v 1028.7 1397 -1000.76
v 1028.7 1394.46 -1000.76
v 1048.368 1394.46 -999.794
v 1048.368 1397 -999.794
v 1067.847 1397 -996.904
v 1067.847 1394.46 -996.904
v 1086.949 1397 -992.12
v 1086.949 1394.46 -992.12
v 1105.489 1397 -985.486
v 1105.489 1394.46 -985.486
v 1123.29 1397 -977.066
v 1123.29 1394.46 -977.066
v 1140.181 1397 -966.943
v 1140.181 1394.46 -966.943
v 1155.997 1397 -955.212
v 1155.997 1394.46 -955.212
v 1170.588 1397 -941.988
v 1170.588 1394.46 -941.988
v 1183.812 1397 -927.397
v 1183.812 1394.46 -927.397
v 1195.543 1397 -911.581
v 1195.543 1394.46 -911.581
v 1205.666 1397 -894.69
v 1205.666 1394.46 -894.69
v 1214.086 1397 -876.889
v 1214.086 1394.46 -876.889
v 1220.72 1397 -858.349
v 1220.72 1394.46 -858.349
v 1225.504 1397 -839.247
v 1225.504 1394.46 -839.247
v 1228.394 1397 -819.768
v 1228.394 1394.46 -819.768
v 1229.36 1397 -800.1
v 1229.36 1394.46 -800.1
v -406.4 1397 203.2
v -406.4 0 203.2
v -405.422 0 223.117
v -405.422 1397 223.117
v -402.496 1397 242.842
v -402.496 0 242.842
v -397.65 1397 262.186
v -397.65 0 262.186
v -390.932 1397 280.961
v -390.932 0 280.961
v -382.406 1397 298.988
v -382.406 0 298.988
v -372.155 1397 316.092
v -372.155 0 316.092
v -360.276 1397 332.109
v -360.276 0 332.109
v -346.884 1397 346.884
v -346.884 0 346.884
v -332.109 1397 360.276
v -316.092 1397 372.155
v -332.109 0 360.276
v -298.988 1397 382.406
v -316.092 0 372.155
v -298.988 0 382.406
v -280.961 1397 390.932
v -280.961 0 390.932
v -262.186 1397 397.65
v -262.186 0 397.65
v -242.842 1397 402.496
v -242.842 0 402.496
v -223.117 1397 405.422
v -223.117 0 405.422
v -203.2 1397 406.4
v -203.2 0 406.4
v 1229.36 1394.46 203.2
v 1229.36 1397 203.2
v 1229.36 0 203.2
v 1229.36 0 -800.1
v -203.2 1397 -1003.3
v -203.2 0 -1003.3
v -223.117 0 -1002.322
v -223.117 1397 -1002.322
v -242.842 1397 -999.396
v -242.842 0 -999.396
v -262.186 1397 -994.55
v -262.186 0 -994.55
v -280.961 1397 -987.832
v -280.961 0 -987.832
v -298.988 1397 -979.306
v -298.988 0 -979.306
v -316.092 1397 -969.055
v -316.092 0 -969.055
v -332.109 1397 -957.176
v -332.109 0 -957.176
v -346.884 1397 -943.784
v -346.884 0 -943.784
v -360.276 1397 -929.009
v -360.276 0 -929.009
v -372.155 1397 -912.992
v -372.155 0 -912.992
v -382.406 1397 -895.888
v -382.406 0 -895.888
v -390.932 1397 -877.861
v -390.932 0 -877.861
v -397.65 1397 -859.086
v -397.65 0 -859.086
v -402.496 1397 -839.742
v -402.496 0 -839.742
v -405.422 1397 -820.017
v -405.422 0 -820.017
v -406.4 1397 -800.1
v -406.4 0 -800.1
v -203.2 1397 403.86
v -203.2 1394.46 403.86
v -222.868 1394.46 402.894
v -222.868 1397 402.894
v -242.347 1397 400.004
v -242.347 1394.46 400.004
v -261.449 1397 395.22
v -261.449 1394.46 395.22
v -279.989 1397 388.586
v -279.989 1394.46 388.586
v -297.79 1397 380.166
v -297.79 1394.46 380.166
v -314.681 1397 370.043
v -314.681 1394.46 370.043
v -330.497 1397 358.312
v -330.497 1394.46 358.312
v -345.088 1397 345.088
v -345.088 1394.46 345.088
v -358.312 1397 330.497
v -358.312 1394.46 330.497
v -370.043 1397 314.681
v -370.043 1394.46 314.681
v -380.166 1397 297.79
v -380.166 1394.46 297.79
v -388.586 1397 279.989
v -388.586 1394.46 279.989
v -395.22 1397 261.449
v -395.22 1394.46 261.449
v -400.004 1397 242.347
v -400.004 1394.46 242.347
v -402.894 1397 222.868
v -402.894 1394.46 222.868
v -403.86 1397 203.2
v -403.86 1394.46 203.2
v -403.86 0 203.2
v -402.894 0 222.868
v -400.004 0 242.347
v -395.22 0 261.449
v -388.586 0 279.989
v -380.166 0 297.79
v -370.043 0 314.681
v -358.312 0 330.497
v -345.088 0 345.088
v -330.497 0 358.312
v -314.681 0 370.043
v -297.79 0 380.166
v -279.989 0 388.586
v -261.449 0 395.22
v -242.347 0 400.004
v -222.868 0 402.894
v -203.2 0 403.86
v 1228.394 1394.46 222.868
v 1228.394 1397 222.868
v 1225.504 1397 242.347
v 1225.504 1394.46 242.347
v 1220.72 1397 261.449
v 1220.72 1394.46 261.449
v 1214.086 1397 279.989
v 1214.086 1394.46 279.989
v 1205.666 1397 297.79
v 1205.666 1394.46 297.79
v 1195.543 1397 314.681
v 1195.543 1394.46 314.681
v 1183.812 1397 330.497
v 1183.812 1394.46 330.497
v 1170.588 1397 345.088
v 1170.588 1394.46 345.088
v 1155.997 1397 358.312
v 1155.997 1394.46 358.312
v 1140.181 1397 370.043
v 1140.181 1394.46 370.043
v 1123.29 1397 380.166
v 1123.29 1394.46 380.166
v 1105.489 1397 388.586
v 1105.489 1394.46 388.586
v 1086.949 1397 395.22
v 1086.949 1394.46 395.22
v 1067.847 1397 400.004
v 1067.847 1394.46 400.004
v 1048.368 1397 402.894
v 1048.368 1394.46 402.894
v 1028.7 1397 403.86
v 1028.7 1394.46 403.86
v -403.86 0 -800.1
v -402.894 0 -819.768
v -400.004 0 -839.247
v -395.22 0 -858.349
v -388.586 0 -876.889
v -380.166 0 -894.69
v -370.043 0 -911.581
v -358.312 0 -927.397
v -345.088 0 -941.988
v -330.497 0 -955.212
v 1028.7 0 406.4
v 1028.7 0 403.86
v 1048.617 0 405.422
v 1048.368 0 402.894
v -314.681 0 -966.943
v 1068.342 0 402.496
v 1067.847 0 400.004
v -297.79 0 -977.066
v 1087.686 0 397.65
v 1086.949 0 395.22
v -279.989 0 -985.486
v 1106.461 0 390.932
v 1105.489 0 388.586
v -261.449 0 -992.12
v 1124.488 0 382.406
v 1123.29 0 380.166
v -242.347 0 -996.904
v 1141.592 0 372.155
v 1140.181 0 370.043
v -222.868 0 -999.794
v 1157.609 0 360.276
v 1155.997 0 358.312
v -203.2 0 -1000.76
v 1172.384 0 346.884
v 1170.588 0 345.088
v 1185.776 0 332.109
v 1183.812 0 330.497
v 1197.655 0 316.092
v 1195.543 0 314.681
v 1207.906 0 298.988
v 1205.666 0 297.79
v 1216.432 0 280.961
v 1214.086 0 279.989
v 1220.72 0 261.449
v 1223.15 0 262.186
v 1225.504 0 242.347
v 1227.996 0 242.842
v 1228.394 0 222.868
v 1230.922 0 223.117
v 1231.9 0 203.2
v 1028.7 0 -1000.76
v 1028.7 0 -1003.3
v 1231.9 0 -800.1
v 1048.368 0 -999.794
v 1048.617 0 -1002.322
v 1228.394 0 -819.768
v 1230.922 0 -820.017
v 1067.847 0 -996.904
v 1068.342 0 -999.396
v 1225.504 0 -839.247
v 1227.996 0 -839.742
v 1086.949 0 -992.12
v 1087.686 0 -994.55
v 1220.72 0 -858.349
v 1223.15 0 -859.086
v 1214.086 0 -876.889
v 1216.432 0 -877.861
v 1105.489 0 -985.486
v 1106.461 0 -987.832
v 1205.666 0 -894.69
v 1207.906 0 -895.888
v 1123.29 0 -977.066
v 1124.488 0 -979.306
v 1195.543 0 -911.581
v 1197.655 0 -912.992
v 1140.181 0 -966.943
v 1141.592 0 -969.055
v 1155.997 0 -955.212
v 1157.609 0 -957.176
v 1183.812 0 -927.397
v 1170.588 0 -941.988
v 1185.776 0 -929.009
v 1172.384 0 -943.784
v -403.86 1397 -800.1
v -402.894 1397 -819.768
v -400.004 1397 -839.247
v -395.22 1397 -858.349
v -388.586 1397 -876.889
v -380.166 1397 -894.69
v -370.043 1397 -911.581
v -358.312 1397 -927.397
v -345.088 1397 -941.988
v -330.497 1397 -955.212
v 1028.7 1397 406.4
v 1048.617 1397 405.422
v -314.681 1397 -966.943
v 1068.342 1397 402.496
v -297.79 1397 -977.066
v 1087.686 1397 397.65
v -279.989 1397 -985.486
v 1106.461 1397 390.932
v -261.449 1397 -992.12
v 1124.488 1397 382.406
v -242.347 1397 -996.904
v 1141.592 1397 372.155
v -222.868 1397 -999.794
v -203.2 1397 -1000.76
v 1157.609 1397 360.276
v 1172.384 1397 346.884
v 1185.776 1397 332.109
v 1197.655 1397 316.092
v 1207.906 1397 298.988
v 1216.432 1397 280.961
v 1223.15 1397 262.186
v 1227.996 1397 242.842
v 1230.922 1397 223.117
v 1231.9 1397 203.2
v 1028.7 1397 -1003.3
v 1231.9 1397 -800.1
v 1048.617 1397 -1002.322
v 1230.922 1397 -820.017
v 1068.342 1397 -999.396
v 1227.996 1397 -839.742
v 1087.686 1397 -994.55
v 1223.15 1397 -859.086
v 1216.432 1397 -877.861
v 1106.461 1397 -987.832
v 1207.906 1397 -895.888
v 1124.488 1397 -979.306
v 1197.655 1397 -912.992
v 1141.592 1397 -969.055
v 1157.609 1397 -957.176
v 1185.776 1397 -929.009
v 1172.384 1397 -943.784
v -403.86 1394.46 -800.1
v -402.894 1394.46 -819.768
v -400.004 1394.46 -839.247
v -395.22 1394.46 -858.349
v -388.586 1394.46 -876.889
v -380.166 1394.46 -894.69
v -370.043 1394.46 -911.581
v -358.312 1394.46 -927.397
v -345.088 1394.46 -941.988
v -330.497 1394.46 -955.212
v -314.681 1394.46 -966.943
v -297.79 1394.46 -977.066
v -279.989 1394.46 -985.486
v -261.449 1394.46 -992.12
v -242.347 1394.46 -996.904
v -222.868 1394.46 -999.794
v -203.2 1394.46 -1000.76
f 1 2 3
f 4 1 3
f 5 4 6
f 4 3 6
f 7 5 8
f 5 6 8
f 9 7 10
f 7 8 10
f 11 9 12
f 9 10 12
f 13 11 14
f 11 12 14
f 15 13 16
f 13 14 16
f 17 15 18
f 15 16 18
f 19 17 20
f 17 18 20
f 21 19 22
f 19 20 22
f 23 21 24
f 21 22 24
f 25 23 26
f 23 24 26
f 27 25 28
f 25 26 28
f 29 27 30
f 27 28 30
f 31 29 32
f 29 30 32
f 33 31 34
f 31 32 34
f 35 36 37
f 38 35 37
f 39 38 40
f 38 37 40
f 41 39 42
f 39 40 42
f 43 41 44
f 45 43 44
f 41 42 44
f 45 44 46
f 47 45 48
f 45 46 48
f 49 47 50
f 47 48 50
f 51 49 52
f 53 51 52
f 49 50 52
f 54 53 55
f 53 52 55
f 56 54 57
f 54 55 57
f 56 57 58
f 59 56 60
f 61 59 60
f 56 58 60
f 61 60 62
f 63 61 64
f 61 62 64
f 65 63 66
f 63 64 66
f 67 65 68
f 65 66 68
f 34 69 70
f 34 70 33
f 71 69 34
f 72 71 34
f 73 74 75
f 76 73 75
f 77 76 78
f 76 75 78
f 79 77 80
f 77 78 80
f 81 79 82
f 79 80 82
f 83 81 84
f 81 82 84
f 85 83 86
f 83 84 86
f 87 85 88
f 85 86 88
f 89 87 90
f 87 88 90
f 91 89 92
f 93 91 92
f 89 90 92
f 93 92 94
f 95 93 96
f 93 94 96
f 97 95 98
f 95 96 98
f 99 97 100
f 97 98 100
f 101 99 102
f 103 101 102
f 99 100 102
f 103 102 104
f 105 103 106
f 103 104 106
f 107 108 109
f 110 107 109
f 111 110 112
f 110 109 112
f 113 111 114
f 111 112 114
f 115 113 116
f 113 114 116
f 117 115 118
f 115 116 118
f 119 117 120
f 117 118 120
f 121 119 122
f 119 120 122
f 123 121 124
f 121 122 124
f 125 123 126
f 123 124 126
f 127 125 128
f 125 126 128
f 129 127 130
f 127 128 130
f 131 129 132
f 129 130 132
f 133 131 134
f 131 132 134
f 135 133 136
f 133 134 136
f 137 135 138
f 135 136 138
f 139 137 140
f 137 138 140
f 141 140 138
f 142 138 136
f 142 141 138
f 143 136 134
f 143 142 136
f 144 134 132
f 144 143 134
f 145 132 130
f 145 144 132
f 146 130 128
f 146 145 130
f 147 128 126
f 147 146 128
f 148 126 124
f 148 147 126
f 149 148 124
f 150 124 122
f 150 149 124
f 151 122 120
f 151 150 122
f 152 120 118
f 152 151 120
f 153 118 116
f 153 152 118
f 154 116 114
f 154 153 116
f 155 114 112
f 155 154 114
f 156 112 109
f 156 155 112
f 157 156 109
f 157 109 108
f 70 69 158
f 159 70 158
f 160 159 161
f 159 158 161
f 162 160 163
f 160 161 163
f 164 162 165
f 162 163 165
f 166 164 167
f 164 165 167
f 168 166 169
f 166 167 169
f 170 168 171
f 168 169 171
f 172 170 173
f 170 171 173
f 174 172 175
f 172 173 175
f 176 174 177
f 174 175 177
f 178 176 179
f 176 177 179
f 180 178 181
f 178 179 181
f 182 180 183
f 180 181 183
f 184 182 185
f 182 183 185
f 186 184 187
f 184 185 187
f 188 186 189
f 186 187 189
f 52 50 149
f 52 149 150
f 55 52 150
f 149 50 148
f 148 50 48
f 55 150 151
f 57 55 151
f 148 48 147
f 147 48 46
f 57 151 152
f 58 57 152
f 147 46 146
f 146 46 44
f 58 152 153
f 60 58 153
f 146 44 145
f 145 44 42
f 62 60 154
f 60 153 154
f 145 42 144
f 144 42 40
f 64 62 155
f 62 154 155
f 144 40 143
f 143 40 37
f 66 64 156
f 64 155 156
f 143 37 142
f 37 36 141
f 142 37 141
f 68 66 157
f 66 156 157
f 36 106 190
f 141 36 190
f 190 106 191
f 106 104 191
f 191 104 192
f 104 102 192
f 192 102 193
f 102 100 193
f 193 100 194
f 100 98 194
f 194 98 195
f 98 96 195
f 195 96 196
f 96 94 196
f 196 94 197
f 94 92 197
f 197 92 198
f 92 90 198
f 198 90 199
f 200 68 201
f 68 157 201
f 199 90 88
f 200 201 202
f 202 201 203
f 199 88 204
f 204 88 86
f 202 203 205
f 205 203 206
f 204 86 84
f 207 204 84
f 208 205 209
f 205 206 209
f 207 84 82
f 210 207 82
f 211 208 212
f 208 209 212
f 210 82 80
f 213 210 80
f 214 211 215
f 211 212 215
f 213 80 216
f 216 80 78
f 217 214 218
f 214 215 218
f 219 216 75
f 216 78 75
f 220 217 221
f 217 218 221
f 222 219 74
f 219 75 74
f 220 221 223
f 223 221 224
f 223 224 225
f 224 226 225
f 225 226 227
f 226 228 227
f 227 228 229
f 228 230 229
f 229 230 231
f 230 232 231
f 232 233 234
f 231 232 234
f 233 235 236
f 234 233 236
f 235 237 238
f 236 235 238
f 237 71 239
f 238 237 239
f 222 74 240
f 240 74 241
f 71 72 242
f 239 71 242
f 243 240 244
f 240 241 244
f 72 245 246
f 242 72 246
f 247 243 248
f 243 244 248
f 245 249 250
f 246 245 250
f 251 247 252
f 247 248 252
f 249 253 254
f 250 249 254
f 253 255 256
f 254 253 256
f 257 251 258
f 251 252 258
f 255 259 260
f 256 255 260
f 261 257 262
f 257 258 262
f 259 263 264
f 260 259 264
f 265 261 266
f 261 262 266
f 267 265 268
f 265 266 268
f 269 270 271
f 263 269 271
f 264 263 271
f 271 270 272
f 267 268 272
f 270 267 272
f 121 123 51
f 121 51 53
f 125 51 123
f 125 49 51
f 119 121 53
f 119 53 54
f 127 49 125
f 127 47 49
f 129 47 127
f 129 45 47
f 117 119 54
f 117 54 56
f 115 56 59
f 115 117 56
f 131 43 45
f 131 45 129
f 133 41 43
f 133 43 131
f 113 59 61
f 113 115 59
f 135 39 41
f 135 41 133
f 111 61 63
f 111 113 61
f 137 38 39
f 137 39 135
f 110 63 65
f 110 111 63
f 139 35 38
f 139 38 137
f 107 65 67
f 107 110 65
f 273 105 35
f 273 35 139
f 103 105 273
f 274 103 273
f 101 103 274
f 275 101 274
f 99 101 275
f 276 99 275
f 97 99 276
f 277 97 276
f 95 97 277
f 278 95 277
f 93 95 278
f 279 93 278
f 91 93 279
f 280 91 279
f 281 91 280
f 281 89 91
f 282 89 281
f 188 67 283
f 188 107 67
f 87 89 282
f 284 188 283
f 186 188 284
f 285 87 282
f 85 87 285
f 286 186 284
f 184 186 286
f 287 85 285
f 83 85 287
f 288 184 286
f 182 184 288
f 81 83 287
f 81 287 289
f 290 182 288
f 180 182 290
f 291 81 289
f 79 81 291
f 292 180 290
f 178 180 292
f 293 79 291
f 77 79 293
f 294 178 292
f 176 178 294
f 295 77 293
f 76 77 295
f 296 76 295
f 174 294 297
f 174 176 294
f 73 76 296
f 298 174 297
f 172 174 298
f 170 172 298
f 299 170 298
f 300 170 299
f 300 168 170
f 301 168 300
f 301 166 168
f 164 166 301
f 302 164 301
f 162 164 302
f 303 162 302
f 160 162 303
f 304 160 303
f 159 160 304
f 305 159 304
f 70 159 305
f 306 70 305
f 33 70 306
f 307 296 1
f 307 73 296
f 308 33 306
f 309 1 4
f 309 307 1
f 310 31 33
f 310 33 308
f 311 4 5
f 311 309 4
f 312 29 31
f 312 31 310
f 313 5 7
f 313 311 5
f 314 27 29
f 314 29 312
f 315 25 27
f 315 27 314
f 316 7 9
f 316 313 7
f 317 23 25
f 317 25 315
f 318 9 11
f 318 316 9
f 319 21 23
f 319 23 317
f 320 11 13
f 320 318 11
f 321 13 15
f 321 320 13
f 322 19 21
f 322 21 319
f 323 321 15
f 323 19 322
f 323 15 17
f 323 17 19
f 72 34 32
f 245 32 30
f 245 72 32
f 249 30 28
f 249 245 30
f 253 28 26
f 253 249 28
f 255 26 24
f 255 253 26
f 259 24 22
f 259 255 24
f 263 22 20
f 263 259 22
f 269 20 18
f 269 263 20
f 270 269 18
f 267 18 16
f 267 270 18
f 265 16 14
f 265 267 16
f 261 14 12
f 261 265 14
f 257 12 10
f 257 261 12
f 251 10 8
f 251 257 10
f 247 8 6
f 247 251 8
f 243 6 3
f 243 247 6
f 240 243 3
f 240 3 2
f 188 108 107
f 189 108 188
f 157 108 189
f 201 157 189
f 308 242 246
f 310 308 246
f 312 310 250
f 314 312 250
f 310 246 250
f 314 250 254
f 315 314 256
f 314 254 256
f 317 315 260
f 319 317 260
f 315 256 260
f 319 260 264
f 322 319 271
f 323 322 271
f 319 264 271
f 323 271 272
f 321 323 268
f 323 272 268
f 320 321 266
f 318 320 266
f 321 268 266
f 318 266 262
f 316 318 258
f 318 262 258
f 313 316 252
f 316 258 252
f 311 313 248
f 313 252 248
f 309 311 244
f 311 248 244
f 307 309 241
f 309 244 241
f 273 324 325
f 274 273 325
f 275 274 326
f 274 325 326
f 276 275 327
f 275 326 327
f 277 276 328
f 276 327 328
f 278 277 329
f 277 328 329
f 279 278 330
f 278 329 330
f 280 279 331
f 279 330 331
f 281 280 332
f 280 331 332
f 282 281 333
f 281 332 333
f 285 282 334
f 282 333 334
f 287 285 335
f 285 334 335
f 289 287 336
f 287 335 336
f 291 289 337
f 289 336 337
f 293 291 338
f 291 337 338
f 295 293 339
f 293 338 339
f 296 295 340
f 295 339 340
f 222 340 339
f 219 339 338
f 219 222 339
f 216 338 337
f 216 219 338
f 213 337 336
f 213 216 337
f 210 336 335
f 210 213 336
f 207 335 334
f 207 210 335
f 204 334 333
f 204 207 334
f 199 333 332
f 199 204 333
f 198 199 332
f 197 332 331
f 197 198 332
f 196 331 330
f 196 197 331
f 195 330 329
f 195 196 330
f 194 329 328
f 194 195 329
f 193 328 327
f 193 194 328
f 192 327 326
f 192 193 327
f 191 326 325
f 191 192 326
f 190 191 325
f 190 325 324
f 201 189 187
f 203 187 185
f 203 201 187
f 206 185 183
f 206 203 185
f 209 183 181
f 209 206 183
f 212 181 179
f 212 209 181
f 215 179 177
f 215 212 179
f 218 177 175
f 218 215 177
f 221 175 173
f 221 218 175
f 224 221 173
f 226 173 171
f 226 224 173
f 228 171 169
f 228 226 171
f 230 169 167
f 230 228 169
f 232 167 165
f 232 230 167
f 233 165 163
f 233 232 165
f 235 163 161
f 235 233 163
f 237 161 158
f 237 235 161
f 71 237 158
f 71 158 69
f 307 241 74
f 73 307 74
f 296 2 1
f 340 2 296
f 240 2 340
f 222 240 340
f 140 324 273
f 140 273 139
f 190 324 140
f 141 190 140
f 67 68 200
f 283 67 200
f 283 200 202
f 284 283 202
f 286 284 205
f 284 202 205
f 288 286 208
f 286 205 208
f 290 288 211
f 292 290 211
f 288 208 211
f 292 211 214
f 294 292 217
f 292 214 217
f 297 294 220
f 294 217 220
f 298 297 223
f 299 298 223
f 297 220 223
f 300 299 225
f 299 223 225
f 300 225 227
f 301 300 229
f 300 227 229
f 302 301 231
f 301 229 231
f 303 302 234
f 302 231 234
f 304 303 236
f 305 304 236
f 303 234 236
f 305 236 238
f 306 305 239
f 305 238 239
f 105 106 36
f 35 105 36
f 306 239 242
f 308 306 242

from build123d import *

# Parameters (mm, degrees)
BOSS_EXTRUDE1_DEPTH = 1397
SHELL1_T            = -2.54
CUT_EXTRUDE3_REACH  = 4.54


with BuildPart() as part:
    # Sketch1 → Boss-Extrude1 (new body)
    with BuildSketch(Plane(origin=(0, 0, 0), x_dir=(1, 0, 0), z_dir=(0, 1, 0))):
        with BuildLine():
            Line((-203.2, -406.4), (1028.7, -406.4))
            ThreePointArc((1028.7, -406.4), (1172.384097937, -346.884097937), (1231.9, -203.2))
            Line((1231.9, -203.2), (1231.9, 800.1))
            ThreePointArc((1231.9, 800.1), (1172.384097937, 943.784097937), (1028.7, 1003.3))
            Line((1028.7, 1003.3), (-203.2, 1003.3))
            ThreePointArc((-203.2, 1003.3), (-346.884097937, 943.784097937), (-406.4, 800.1))
            Line((-406.4, 800.1), (-406.4, -203.2))
            ThreePointArc((-406.4, -203.2), (-346.884097937, -346.884097937), (-203.2, -406.4))
        make_face()
    extrude(amount=BOSS_EXTRUDE1_DEPTH)

    # Shell1
    shell1_openings = [part.faces().sort_by_distance(p)[0] for p in [
        (412.75, 0, -298.45),
    ]]
    offset(amount=SHELL1_T, openings=shell1_openings, kind=Kind.INTERSECTION)

    # Sketch3 → Cut-Extrude3 (cut, up to next)
    with BuildSketch(Plane.XZ.offset(-1394.46), mode=Mode.PRIVATE) as cut_extrude3_sk1:
        with BuildLine():
            Line((-403.86, 203.2), (-403.86, -800.1))
            ThreePointArc((-403.86, -800.1), (-345.088046713, -941.988046713), (-203.2, -1000.76))
            Line((-203.2, -1000.76), (1028.7, -1000.76))
            ThreePointArc((1028.7, -1000.76), (1170.588046713, -941.988046713), (1229.36, -800.1))
            Line((1229.36, -800.1), (1229.36, 203.2))
            ThreePointArc((1229.36, 203.2), (1170.588046713, 345.088046713), (1028.7, 403.86))
            Line((1028.7, 403.86), (-203.2, 403.86))
            ThreePointArc((-203.2, 403.86), (-345.088046713, 345.088046713), (-403.86, 203.2))
        make_face()
    cut_extrude3_tool1 = extrude(cut_extrude3_sk1.sketch, amount=-CUT_EXTRUDE3_REACH, mode=Mode.PRIVATE) & part.part
    add(cut_extrude3_tool1.solids().sort_by_distance((412.75, 1394.46, -298.45))[0], mode=Mode.SUBTRACT)


solid = part.part
